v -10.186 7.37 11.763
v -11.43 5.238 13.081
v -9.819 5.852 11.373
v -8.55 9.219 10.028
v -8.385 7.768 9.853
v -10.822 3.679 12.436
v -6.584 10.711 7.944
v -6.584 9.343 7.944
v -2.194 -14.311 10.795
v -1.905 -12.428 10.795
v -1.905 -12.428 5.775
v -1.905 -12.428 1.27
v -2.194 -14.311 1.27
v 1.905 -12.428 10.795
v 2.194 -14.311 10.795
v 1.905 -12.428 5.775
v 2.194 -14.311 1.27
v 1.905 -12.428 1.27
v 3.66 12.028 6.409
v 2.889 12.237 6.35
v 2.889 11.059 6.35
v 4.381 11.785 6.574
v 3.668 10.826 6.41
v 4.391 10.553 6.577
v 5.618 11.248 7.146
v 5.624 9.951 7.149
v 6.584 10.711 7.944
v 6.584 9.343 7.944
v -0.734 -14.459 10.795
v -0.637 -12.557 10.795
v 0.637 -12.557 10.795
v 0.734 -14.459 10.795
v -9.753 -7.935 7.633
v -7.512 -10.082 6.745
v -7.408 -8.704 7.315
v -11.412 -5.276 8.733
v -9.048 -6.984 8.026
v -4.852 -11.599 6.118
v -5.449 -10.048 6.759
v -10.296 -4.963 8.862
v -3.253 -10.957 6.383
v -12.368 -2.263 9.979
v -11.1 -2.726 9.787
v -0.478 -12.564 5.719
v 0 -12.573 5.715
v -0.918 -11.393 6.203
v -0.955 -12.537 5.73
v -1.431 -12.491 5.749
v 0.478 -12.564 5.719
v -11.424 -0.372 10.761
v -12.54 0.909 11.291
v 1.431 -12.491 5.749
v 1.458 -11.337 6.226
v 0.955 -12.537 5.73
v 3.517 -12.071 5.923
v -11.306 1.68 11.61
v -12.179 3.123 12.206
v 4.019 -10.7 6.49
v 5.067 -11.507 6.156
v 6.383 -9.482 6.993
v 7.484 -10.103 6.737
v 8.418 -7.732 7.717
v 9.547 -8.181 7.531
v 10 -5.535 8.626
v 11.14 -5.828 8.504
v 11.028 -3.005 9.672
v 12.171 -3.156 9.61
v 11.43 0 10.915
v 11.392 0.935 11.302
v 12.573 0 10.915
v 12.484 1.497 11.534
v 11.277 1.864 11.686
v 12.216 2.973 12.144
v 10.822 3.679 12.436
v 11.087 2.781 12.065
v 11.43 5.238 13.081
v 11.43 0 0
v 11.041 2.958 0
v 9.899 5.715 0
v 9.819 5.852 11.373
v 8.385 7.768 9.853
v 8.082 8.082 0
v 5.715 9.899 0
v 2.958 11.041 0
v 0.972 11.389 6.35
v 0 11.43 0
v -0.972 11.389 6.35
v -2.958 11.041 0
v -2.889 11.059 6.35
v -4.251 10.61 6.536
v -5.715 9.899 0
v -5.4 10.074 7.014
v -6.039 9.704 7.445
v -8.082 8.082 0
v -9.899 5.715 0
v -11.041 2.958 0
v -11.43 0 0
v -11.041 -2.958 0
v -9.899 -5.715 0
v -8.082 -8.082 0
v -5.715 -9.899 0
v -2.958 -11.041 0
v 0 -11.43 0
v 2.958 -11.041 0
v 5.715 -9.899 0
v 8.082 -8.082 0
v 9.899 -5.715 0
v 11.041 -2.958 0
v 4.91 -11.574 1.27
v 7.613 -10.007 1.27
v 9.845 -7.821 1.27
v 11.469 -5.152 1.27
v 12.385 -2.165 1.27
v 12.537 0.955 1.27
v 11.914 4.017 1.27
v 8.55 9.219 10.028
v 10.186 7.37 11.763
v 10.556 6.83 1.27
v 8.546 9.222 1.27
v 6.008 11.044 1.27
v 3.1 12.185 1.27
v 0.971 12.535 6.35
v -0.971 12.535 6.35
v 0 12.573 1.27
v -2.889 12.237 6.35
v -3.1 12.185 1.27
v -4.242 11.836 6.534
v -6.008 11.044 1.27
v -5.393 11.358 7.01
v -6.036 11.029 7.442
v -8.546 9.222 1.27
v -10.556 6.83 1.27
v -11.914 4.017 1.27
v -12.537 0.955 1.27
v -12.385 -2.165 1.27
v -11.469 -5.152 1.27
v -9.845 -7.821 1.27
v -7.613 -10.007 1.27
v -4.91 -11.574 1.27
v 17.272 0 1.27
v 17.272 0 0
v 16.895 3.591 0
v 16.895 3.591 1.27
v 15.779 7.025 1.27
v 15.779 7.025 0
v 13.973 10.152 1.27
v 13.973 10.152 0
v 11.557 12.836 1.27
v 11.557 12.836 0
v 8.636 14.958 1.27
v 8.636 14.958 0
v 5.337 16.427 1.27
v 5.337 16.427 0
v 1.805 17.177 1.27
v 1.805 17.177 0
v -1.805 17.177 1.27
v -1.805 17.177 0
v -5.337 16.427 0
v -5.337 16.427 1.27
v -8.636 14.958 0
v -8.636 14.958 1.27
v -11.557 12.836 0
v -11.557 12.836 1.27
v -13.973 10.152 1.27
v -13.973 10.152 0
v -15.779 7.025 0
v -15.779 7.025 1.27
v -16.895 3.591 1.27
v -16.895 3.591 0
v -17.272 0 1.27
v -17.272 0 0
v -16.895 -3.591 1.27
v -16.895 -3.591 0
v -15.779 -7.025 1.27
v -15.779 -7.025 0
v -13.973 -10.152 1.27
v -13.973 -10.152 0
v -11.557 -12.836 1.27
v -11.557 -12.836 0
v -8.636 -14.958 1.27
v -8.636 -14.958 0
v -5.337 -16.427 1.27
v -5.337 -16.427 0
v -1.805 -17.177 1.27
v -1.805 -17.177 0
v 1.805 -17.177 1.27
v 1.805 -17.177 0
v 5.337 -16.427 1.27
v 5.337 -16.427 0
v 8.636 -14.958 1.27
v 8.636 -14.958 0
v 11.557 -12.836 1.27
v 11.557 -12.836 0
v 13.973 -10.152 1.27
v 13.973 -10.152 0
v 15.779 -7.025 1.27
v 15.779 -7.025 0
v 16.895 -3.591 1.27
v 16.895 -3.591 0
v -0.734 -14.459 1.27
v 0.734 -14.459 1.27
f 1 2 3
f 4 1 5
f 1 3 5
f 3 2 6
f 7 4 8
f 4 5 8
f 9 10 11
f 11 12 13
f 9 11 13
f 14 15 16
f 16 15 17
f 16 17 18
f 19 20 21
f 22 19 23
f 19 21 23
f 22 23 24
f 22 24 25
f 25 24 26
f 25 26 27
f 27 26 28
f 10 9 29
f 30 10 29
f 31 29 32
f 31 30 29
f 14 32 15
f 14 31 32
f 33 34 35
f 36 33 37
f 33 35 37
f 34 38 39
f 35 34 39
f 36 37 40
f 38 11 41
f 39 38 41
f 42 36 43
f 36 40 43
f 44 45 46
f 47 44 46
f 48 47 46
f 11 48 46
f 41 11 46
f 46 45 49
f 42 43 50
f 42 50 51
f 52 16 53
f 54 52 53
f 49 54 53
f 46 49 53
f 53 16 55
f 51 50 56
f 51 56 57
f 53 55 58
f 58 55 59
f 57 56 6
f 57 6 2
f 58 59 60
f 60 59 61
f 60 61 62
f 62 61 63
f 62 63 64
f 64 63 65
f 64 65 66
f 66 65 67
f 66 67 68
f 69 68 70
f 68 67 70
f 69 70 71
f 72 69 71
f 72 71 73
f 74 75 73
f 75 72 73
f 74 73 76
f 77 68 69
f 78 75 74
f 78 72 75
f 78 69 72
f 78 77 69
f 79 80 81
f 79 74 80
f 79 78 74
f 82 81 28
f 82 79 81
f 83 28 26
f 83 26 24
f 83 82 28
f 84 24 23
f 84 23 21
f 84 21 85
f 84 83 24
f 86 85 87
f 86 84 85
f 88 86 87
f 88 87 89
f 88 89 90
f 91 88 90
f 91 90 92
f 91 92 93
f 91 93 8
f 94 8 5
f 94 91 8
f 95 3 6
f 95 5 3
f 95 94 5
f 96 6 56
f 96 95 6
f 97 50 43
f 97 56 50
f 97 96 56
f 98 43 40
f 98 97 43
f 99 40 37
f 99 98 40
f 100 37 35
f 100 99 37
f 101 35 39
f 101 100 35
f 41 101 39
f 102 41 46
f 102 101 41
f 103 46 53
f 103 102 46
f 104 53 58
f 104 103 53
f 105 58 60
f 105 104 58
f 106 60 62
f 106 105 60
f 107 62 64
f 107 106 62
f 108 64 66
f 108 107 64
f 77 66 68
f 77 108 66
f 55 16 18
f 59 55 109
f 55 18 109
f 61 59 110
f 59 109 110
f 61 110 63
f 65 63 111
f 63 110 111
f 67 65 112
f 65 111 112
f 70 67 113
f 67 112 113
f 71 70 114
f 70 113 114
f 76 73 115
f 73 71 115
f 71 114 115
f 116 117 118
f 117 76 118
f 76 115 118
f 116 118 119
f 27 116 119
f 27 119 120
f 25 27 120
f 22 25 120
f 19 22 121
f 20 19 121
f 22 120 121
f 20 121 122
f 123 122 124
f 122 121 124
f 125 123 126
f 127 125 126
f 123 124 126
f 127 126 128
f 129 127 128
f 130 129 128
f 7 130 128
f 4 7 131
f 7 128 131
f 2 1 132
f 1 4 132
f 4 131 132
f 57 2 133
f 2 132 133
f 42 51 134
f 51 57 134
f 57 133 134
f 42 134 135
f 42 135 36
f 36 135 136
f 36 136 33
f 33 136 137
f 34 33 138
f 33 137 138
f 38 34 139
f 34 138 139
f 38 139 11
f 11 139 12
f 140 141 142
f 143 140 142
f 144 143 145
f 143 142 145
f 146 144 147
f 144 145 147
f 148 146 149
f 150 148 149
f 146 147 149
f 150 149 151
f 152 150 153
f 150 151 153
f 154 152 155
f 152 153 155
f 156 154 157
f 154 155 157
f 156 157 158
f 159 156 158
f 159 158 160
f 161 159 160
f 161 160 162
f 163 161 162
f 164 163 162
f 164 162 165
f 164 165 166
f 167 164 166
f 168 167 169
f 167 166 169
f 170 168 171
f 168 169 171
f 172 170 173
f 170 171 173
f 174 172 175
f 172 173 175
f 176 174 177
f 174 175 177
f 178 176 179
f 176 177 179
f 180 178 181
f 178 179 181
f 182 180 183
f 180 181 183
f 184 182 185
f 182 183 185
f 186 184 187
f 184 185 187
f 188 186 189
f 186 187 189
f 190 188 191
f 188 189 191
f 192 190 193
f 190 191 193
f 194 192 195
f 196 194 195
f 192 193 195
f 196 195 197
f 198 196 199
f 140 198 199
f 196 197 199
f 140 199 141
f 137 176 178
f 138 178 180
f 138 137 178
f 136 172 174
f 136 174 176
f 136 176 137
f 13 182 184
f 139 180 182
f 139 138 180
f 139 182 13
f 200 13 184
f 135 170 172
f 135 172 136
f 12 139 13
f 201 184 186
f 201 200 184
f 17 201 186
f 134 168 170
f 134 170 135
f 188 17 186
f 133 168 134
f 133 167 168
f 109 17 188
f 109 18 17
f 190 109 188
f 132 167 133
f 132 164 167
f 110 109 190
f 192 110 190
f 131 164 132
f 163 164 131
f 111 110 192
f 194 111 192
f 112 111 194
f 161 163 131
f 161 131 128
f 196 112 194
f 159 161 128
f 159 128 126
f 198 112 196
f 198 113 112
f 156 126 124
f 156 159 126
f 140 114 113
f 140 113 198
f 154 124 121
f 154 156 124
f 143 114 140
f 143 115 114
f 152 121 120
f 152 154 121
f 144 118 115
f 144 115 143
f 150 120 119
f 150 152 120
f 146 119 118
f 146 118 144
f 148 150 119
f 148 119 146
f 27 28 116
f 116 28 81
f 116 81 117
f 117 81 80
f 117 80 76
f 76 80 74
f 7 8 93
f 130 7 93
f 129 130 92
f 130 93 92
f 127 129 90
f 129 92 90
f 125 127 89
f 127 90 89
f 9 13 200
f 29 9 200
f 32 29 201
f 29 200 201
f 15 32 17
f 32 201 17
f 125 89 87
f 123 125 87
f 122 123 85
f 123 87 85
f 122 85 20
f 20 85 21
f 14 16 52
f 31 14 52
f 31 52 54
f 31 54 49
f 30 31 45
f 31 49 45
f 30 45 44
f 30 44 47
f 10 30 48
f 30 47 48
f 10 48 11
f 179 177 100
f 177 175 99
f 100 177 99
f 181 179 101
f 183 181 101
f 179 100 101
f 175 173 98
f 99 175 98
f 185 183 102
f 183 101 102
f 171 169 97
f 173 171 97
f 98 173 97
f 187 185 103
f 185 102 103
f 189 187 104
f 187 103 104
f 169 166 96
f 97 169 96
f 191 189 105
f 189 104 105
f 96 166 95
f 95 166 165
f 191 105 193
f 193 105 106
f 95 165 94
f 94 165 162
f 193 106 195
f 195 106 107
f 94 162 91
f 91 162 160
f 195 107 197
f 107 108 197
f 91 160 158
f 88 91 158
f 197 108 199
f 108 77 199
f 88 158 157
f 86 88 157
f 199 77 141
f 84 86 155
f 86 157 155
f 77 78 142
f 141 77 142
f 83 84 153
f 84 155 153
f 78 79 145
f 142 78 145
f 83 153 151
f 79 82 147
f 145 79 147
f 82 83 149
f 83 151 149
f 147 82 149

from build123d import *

# Parameters (mm, degrees)
F0_R     = 17.272
F0_R_2   = 11.43
F1_DEPTH = 1.27
F2_R     = 12.573
F2_R_2   = 11.43
F3_DEPTH = 11.811
F5_DEPTH = 17.273
F7_DEPTH = 12.7
F9_DEPTH = 9.525


with BuildPart() as f1:
    # F0 (on Top) → F1 (new body)
    with BuildSketch(Plane.XY):
        Circle(F0_R)
        Circle(F0_R_2, mode=Mode.SUBTRACT)
    extrude(amount=F1_DEPTH)

    # F2 (on face) → F3 (join)
    with BuildSketch(Plane.XY.offset(1.27)):
        Circle(F2_R)
        Circle(F2_R_2, mode=Mode.SUBTRACT)
    extrude(amount=F3_DEPTH)

    # F4 (on Front) → F5 (cut, through all)
    with BuildSketch(Plane.XZ):
        with BuildLine():
            Line((-2.888614, 6.35), (2.888614, 6.35))
            ThreePointArc((2.888614, 6.35), (4.900767, 6.765492), (6.583774, 7.944))
            Line((6.583774, 7.944), (11.43, 13.081))
            Line((11.43, 13.081), (-11.43, 13.081))
            Line((-11.43, 13.081), (-6.583774, 7.944))
            ThreePointArc((-6.583774, 7.944), (-4.900767, 6.765492), (-2.888614, 6.35))
        make_face()
    extrude(amount=-F5_DEPTH, mode=Mode.SUBTRACT)

    # F6 (on Right) → F7 (cut, symmetric)
    with BuildSketch(Plane.YZ):
        Polygon((-12.573, 5.715), (5.237884, 13.081), (-12.573, 13.081), align=None)
    extrude(amount=F7_DEPTH, both=True, mode=Mode.SUBTRACT)

    # F8 (on face) → F9 (join)
    with BuildSketch(Plane.XY.offset(1.27)):
        with BuildLine():
            Line((2.193636, -14.310851), (1.905, -12.427844))
            ThreePointArc((1.905, -12.427844), (0, -12.573), (-1.905, -12.427844))
            Line((-1.905, -12.427844), (-2.193636, -14.310851))
            ThreePointArc((-2.193636, -14.310851), (0, -14.478), (2.193636, -14.310851))
        make_face()
    extrude(amount=F9_DEPTH)


solid = f1.part
